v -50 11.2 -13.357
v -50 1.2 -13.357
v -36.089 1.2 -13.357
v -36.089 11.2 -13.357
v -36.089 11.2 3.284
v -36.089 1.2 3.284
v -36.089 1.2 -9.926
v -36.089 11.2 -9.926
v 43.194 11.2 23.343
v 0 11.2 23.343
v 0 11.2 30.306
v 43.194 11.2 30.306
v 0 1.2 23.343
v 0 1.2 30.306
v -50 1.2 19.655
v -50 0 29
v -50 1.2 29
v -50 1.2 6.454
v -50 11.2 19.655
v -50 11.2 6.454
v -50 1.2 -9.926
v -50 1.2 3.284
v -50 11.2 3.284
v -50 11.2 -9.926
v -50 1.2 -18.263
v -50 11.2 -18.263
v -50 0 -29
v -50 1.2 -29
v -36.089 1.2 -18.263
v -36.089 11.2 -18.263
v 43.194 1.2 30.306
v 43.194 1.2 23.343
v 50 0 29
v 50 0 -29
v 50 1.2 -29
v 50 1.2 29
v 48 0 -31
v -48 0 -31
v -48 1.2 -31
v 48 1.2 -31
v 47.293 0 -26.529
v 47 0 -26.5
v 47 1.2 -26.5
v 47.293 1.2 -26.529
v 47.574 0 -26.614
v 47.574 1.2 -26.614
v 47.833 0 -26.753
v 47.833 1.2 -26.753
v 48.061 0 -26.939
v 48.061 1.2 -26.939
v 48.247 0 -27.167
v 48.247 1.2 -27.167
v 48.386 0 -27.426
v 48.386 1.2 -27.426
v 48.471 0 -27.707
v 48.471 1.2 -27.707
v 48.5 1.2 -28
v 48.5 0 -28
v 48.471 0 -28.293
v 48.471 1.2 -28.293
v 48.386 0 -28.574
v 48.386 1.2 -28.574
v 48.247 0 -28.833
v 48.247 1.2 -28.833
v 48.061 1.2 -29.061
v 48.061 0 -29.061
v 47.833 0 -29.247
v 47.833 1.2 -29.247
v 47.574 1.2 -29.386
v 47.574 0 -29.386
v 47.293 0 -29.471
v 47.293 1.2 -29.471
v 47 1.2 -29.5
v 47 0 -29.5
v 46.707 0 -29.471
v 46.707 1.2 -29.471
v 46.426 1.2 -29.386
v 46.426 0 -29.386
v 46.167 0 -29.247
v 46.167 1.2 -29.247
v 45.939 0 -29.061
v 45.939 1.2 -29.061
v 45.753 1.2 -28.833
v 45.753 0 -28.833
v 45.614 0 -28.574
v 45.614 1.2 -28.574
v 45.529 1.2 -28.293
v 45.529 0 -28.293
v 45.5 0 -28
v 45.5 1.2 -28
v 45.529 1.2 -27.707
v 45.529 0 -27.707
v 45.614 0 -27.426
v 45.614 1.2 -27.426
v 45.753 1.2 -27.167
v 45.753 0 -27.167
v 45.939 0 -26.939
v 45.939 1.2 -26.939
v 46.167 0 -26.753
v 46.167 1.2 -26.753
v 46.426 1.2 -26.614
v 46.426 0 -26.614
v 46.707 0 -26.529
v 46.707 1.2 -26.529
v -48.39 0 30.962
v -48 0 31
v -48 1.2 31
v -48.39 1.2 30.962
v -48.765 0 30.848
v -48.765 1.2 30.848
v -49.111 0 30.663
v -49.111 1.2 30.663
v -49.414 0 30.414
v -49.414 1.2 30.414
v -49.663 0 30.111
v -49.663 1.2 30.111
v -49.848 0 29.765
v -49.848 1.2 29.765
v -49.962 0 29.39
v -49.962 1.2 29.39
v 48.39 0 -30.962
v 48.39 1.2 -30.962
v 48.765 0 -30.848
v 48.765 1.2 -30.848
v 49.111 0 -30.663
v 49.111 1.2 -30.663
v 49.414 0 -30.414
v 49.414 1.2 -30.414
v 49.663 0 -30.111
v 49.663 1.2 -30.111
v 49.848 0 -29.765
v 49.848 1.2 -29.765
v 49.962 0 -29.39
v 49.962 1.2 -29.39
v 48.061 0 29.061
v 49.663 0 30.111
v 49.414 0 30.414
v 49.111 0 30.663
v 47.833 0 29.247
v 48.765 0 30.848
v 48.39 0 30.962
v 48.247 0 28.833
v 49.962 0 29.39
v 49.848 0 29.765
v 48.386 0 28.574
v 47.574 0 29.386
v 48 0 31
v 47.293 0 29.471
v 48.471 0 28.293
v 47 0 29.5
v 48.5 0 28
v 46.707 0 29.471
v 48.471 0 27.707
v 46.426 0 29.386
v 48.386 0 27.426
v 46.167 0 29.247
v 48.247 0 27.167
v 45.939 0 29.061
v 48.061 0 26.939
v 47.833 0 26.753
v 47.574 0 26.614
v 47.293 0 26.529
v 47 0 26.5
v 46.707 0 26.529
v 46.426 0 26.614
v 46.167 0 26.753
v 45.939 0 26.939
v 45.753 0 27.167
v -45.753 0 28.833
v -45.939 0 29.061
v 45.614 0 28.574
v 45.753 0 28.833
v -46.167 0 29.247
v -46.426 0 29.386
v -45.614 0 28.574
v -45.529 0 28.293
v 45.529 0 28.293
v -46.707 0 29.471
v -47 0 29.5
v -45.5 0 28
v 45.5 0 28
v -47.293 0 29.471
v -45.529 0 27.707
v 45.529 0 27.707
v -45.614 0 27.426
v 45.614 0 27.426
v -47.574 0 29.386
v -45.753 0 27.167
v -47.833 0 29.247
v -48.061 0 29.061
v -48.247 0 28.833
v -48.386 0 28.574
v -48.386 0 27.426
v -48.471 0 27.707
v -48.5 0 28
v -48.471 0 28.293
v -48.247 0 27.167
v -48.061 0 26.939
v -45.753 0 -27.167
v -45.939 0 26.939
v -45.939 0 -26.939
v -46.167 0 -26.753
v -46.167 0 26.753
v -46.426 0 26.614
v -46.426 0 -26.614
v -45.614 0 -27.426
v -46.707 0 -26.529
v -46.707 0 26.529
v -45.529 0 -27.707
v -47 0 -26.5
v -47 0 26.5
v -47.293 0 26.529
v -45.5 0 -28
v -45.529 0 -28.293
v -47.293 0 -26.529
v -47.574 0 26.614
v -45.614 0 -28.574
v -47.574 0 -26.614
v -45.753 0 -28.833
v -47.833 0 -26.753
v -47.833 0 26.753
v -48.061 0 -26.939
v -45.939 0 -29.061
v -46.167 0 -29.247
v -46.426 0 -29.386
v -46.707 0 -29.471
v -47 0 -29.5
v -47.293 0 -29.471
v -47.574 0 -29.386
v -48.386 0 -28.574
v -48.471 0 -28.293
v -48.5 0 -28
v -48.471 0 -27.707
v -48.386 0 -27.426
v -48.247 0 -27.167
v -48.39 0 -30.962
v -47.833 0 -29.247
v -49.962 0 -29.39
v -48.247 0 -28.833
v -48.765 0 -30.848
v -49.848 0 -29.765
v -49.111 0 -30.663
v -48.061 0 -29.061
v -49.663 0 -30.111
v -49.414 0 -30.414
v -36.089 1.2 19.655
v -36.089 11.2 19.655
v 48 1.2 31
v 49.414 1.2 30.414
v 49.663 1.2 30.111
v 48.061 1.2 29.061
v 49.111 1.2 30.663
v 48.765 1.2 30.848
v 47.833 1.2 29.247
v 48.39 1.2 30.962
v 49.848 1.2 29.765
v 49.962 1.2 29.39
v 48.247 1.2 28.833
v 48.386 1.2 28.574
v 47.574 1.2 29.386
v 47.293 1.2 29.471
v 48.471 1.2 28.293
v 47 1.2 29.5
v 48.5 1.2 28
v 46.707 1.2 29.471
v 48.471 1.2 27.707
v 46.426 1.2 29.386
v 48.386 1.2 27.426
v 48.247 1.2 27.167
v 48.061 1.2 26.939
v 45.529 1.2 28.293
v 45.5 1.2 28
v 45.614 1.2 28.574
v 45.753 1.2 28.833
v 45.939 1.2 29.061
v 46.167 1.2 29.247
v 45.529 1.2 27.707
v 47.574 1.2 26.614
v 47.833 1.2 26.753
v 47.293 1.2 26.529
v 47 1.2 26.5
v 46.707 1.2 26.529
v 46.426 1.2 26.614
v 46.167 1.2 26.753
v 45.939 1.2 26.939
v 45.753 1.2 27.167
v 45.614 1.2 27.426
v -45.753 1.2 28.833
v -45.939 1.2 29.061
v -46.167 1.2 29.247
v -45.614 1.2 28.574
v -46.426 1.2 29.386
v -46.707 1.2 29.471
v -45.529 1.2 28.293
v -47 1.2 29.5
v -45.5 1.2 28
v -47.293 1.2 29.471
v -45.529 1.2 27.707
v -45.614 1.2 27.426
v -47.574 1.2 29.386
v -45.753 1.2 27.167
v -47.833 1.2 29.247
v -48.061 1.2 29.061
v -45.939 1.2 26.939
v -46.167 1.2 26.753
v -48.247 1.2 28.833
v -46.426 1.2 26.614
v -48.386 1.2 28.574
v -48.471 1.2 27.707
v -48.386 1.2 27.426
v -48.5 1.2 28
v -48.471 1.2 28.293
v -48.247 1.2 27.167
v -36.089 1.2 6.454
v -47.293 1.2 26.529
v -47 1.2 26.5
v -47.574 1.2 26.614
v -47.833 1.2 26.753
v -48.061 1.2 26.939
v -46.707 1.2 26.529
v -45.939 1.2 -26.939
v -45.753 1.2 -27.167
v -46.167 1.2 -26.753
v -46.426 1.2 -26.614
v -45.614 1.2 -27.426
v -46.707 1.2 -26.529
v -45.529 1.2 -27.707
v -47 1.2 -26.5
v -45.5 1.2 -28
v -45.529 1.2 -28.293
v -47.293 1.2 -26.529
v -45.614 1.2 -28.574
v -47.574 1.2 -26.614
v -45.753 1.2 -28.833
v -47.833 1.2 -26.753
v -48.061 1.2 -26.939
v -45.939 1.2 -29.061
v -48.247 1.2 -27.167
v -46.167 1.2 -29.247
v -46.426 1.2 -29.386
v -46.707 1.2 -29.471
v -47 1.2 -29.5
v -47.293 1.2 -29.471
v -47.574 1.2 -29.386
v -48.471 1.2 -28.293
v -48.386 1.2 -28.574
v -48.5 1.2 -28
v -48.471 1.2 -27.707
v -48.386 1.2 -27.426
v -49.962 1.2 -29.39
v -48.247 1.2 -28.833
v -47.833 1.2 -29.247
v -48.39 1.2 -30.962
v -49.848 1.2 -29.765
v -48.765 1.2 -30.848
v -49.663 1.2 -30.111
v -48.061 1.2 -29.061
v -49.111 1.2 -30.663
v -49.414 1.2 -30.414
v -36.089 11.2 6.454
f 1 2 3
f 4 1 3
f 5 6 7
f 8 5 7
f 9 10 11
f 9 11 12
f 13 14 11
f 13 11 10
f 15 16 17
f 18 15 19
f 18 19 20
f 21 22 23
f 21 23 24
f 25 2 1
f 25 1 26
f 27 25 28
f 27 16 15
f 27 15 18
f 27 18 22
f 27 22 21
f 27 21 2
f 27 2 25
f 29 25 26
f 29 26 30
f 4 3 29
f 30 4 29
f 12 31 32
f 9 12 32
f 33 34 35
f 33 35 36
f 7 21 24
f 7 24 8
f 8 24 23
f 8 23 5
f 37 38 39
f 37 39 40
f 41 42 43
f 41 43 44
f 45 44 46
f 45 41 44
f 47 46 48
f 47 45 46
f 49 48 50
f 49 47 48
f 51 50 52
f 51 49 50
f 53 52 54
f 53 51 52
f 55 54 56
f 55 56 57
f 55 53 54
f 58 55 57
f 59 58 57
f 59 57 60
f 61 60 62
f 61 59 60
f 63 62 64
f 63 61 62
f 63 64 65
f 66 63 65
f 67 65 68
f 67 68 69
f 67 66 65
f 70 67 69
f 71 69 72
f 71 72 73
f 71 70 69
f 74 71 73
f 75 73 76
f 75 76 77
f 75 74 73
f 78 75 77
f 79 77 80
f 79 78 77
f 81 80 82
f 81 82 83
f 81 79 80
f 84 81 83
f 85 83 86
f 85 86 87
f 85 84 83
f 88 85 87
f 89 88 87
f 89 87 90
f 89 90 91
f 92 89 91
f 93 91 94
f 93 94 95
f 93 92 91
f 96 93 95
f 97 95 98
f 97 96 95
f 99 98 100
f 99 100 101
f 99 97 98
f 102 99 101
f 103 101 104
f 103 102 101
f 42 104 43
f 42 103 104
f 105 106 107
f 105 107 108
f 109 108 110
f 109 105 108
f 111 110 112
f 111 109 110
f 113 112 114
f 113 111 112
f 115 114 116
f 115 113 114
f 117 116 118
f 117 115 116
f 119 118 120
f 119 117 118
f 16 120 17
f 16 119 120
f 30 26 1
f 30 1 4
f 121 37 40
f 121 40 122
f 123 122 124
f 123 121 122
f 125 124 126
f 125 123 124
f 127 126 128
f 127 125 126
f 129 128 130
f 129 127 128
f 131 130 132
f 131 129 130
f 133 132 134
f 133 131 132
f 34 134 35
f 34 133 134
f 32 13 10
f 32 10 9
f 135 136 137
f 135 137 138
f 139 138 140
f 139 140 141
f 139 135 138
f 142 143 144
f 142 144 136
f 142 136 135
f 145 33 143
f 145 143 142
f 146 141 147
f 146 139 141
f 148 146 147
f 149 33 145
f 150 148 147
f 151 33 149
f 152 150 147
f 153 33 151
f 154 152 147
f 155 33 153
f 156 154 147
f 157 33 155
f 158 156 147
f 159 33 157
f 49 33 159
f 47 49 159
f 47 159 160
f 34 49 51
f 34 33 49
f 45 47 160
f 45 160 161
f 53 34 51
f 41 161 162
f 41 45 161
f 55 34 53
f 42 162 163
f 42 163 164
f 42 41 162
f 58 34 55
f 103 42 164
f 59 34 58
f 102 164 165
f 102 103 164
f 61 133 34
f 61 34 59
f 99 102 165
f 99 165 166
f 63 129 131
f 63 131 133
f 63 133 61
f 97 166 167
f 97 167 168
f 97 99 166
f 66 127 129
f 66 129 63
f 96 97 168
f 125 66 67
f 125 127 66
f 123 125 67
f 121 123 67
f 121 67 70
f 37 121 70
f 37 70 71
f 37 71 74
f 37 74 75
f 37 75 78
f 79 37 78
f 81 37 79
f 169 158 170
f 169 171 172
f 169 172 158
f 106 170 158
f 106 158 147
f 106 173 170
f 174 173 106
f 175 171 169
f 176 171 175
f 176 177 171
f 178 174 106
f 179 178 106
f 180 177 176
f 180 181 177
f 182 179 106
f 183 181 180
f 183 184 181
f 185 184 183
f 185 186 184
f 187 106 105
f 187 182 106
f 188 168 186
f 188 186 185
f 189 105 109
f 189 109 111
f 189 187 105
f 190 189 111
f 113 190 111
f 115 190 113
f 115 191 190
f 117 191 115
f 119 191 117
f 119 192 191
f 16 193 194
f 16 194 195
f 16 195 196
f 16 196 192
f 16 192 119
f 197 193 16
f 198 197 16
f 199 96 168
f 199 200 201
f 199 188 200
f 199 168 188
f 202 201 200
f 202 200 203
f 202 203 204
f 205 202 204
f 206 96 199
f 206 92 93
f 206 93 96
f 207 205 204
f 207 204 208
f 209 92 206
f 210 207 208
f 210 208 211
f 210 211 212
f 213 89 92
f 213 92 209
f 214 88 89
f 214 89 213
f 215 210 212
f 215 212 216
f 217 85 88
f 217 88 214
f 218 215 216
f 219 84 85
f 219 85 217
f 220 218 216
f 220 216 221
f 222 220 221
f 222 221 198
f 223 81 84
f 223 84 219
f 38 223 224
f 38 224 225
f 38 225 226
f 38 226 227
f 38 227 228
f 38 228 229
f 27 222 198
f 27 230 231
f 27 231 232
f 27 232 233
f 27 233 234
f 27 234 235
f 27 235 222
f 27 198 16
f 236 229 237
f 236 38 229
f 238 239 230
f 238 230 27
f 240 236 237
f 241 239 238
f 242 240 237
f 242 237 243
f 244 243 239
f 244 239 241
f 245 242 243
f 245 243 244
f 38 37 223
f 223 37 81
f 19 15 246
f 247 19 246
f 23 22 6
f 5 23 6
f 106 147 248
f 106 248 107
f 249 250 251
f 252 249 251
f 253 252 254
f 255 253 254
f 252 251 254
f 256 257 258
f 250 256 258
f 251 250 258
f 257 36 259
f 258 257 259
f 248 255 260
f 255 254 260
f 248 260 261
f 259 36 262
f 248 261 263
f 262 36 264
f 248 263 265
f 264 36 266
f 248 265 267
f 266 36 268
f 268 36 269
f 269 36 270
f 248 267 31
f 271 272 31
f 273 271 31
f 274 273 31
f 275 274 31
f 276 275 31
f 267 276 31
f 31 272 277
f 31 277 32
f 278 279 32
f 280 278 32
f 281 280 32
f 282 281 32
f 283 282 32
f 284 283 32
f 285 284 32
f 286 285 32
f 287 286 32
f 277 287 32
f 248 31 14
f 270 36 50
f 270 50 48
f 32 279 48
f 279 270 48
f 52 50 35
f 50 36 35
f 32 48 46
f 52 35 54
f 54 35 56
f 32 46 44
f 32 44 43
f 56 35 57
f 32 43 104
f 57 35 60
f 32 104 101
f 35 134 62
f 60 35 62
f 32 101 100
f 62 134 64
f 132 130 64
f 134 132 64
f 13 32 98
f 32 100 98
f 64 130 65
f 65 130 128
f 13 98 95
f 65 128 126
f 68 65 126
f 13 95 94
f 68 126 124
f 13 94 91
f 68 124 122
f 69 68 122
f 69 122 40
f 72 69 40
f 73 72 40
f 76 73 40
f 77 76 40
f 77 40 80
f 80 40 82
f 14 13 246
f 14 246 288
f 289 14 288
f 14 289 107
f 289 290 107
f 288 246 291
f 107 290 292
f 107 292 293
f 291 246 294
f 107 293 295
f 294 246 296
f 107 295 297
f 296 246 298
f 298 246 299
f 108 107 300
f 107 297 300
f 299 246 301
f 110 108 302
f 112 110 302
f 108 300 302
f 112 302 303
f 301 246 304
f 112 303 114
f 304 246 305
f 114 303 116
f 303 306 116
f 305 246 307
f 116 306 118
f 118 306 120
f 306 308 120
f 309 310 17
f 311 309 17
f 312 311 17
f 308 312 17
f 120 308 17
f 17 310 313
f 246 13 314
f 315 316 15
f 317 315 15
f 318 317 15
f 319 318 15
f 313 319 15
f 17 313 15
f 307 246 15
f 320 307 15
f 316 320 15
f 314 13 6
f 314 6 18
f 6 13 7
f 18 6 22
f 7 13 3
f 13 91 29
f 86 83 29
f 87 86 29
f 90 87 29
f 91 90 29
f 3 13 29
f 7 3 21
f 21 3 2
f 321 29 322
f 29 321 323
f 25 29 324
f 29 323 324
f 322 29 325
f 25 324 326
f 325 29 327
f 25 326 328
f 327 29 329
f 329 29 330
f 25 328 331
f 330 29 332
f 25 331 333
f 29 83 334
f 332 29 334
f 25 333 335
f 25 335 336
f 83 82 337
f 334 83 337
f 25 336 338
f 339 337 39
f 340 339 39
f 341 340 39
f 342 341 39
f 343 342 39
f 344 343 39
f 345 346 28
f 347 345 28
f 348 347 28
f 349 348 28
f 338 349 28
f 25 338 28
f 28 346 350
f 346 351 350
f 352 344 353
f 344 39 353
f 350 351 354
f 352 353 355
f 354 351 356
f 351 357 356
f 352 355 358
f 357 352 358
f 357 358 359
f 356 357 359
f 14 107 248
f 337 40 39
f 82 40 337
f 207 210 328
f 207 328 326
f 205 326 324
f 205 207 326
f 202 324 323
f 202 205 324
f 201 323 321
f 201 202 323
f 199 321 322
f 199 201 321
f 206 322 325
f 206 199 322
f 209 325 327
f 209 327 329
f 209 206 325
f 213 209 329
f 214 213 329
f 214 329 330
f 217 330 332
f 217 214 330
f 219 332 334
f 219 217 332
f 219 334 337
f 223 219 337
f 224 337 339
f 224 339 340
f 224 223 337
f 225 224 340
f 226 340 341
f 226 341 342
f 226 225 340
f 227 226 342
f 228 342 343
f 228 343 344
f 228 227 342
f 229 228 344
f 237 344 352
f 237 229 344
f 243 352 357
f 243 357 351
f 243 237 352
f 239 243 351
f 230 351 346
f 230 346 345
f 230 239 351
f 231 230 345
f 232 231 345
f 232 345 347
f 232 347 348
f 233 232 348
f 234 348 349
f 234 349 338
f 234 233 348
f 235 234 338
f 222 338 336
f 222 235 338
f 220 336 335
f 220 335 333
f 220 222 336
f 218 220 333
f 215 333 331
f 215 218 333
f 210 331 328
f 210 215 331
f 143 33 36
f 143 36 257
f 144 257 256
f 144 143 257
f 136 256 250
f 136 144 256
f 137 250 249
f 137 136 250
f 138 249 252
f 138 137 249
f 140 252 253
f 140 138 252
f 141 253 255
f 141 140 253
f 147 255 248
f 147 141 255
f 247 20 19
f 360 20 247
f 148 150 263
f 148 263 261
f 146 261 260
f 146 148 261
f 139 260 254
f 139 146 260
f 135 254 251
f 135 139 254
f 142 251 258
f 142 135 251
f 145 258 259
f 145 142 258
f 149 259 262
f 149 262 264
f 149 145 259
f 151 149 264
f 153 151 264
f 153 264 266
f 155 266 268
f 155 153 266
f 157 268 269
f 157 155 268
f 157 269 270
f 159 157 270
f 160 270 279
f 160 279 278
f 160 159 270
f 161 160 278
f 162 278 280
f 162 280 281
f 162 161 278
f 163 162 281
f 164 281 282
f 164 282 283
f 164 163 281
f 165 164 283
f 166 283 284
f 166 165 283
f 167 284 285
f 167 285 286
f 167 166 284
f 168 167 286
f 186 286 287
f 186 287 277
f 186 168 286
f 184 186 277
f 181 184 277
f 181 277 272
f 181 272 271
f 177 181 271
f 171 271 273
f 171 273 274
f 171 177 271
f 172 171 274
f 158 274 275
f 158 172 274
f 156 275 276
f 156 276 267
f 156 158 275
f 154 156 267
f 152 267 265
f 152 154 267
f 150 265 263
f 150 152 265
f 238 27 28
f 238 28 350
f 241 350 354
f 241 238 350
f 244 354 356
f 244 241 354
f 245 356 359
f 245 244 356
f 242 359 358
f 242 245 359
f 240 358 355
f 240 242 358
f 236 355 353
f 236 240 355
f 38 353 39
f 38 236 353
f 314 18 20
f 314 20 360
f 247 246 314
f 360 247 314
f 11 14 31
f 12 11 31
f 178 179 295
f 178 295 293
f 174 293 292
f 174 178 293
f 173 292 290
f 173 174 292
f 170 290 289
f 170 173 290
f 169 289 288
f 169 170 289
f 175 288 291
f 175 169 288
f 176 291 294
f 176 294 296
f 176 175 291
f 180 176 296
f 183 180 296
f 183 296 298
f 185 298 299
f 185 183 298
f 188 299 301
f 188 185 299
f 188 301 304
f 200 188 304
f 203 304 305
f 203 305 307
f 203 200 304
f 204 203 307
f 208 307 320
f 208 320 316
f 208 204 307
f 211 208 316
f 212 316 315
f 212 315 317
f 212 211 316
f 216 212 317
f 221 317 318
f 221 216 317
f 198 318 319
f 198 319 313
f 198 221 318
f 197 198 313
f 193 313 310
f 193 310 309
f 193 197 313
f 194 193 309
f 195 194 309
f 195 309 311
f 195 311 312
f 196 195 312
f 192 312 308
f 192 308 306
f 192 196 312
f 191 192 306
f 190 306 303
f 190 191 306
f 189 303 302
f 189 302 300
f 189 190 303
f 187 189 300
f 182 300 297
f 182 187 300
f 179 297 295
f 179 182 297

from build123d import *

# Parameters (mm, degrees)
SKETCH_1_R      = 1.5
EXTRUDE_1_DEPTH = 1.2
SKETCH_2_W      = 13.910579459
SKETCH_2_H      = 13.201638929
SKETCH_2_H_2    = 13.209823538
SKETCH_2_H_3    = 4.905965234
EXTRUDE_2_DEPTH = 10
SKETCH_3_W      = 43.193790083
SKETCH_3_H      = 6.962206473
EXTRUDE_3_DEPTH = 10


with BuildPart() as part:
    # 草图1 → 凸台-拉伸1 (new body)
    with BuildSketch(Plane(origin=(0, 0, 0), x_dir=(1, 0, 0), z_dir=(0, 1, 0))):
        with BuildLine():
            Line((48, -31), (-48, -31))
            ThreePointArc((-48, -31), (-49.414213562, -30.414213562), (-50, -29))
            Line((-50, -29), (-50, 29))
            ThreePointArc((-50, 29), (-49.414213562, 30.414213562), (-48, 31))
            Line((-48, 31), (48, 31))
            ThreePointArc((48, 31), (49.414213562, 30.414213562), (50, 29))
            Line((50, 29), (50, -29))
            ThreePointArc((50, -29), (49.414213562, -30.414213562), (48, -31))
        make_face()
        with Locations(Location((-47, 28, 0), (0, 0, 270))):
            Circle(SKETCH_1_R, mode=Mode.SUBTRACT)
        with Locations(Location((47, 28, 0), (0, 0, 270))):
            Circle(SKETCH_1_R, mode=Mode.SUBTRACT)
        with Locations(Location((47, -28, 0), (0, 0, 270))):
            Circle(SKETCH_1_R, mode=Mode.SUBTRACT)
        with Locations(Location((-47, -28, 0), (0, 0, 270))):
            Circle(SKETCH_1_R, mode=Mode.SUBTRACT)
    extrude(amount=EXTRUDE_1_DEPTH)

    # 草图2 → 凸台-拉伸2 (add)
    with BuildSketch(Plane(origin=(0, 1.2, 0), x_dir=(1, 0, 0), z_dir=(0, 1, 0))):
        with Locations((-43.044710271, -13.054661049)):
            Rectangle(SKETCH_2_W, SKETCH_2_H)
        with Locations((-43.044710271, 3.320886699)):
            Rectangle(SKETCH_2_W, SKETCH_2_H_2)
        with Locations((-43.044710271, 15.810299107)):
            Rectangle(SKETCH_2_W, SKETCH_2_H_3)
    extrude(amount=EXTRUDE_2_DEPTH)

    # 草图3 → 凸台-拉伸3 (add)
    with BuildSketch(Plane(origin=(0, 1.2, 0), x_dir=(1, 0, 0), z_dir=(0, 1, 0))):
        with Locations((21.596895042, -26.824460666)):
            Rectangle(SKETCH_3_W, SKETCH_3_H)
    extrude(amount=EXTRUDE_3_DEPTH)


solid = part.part
